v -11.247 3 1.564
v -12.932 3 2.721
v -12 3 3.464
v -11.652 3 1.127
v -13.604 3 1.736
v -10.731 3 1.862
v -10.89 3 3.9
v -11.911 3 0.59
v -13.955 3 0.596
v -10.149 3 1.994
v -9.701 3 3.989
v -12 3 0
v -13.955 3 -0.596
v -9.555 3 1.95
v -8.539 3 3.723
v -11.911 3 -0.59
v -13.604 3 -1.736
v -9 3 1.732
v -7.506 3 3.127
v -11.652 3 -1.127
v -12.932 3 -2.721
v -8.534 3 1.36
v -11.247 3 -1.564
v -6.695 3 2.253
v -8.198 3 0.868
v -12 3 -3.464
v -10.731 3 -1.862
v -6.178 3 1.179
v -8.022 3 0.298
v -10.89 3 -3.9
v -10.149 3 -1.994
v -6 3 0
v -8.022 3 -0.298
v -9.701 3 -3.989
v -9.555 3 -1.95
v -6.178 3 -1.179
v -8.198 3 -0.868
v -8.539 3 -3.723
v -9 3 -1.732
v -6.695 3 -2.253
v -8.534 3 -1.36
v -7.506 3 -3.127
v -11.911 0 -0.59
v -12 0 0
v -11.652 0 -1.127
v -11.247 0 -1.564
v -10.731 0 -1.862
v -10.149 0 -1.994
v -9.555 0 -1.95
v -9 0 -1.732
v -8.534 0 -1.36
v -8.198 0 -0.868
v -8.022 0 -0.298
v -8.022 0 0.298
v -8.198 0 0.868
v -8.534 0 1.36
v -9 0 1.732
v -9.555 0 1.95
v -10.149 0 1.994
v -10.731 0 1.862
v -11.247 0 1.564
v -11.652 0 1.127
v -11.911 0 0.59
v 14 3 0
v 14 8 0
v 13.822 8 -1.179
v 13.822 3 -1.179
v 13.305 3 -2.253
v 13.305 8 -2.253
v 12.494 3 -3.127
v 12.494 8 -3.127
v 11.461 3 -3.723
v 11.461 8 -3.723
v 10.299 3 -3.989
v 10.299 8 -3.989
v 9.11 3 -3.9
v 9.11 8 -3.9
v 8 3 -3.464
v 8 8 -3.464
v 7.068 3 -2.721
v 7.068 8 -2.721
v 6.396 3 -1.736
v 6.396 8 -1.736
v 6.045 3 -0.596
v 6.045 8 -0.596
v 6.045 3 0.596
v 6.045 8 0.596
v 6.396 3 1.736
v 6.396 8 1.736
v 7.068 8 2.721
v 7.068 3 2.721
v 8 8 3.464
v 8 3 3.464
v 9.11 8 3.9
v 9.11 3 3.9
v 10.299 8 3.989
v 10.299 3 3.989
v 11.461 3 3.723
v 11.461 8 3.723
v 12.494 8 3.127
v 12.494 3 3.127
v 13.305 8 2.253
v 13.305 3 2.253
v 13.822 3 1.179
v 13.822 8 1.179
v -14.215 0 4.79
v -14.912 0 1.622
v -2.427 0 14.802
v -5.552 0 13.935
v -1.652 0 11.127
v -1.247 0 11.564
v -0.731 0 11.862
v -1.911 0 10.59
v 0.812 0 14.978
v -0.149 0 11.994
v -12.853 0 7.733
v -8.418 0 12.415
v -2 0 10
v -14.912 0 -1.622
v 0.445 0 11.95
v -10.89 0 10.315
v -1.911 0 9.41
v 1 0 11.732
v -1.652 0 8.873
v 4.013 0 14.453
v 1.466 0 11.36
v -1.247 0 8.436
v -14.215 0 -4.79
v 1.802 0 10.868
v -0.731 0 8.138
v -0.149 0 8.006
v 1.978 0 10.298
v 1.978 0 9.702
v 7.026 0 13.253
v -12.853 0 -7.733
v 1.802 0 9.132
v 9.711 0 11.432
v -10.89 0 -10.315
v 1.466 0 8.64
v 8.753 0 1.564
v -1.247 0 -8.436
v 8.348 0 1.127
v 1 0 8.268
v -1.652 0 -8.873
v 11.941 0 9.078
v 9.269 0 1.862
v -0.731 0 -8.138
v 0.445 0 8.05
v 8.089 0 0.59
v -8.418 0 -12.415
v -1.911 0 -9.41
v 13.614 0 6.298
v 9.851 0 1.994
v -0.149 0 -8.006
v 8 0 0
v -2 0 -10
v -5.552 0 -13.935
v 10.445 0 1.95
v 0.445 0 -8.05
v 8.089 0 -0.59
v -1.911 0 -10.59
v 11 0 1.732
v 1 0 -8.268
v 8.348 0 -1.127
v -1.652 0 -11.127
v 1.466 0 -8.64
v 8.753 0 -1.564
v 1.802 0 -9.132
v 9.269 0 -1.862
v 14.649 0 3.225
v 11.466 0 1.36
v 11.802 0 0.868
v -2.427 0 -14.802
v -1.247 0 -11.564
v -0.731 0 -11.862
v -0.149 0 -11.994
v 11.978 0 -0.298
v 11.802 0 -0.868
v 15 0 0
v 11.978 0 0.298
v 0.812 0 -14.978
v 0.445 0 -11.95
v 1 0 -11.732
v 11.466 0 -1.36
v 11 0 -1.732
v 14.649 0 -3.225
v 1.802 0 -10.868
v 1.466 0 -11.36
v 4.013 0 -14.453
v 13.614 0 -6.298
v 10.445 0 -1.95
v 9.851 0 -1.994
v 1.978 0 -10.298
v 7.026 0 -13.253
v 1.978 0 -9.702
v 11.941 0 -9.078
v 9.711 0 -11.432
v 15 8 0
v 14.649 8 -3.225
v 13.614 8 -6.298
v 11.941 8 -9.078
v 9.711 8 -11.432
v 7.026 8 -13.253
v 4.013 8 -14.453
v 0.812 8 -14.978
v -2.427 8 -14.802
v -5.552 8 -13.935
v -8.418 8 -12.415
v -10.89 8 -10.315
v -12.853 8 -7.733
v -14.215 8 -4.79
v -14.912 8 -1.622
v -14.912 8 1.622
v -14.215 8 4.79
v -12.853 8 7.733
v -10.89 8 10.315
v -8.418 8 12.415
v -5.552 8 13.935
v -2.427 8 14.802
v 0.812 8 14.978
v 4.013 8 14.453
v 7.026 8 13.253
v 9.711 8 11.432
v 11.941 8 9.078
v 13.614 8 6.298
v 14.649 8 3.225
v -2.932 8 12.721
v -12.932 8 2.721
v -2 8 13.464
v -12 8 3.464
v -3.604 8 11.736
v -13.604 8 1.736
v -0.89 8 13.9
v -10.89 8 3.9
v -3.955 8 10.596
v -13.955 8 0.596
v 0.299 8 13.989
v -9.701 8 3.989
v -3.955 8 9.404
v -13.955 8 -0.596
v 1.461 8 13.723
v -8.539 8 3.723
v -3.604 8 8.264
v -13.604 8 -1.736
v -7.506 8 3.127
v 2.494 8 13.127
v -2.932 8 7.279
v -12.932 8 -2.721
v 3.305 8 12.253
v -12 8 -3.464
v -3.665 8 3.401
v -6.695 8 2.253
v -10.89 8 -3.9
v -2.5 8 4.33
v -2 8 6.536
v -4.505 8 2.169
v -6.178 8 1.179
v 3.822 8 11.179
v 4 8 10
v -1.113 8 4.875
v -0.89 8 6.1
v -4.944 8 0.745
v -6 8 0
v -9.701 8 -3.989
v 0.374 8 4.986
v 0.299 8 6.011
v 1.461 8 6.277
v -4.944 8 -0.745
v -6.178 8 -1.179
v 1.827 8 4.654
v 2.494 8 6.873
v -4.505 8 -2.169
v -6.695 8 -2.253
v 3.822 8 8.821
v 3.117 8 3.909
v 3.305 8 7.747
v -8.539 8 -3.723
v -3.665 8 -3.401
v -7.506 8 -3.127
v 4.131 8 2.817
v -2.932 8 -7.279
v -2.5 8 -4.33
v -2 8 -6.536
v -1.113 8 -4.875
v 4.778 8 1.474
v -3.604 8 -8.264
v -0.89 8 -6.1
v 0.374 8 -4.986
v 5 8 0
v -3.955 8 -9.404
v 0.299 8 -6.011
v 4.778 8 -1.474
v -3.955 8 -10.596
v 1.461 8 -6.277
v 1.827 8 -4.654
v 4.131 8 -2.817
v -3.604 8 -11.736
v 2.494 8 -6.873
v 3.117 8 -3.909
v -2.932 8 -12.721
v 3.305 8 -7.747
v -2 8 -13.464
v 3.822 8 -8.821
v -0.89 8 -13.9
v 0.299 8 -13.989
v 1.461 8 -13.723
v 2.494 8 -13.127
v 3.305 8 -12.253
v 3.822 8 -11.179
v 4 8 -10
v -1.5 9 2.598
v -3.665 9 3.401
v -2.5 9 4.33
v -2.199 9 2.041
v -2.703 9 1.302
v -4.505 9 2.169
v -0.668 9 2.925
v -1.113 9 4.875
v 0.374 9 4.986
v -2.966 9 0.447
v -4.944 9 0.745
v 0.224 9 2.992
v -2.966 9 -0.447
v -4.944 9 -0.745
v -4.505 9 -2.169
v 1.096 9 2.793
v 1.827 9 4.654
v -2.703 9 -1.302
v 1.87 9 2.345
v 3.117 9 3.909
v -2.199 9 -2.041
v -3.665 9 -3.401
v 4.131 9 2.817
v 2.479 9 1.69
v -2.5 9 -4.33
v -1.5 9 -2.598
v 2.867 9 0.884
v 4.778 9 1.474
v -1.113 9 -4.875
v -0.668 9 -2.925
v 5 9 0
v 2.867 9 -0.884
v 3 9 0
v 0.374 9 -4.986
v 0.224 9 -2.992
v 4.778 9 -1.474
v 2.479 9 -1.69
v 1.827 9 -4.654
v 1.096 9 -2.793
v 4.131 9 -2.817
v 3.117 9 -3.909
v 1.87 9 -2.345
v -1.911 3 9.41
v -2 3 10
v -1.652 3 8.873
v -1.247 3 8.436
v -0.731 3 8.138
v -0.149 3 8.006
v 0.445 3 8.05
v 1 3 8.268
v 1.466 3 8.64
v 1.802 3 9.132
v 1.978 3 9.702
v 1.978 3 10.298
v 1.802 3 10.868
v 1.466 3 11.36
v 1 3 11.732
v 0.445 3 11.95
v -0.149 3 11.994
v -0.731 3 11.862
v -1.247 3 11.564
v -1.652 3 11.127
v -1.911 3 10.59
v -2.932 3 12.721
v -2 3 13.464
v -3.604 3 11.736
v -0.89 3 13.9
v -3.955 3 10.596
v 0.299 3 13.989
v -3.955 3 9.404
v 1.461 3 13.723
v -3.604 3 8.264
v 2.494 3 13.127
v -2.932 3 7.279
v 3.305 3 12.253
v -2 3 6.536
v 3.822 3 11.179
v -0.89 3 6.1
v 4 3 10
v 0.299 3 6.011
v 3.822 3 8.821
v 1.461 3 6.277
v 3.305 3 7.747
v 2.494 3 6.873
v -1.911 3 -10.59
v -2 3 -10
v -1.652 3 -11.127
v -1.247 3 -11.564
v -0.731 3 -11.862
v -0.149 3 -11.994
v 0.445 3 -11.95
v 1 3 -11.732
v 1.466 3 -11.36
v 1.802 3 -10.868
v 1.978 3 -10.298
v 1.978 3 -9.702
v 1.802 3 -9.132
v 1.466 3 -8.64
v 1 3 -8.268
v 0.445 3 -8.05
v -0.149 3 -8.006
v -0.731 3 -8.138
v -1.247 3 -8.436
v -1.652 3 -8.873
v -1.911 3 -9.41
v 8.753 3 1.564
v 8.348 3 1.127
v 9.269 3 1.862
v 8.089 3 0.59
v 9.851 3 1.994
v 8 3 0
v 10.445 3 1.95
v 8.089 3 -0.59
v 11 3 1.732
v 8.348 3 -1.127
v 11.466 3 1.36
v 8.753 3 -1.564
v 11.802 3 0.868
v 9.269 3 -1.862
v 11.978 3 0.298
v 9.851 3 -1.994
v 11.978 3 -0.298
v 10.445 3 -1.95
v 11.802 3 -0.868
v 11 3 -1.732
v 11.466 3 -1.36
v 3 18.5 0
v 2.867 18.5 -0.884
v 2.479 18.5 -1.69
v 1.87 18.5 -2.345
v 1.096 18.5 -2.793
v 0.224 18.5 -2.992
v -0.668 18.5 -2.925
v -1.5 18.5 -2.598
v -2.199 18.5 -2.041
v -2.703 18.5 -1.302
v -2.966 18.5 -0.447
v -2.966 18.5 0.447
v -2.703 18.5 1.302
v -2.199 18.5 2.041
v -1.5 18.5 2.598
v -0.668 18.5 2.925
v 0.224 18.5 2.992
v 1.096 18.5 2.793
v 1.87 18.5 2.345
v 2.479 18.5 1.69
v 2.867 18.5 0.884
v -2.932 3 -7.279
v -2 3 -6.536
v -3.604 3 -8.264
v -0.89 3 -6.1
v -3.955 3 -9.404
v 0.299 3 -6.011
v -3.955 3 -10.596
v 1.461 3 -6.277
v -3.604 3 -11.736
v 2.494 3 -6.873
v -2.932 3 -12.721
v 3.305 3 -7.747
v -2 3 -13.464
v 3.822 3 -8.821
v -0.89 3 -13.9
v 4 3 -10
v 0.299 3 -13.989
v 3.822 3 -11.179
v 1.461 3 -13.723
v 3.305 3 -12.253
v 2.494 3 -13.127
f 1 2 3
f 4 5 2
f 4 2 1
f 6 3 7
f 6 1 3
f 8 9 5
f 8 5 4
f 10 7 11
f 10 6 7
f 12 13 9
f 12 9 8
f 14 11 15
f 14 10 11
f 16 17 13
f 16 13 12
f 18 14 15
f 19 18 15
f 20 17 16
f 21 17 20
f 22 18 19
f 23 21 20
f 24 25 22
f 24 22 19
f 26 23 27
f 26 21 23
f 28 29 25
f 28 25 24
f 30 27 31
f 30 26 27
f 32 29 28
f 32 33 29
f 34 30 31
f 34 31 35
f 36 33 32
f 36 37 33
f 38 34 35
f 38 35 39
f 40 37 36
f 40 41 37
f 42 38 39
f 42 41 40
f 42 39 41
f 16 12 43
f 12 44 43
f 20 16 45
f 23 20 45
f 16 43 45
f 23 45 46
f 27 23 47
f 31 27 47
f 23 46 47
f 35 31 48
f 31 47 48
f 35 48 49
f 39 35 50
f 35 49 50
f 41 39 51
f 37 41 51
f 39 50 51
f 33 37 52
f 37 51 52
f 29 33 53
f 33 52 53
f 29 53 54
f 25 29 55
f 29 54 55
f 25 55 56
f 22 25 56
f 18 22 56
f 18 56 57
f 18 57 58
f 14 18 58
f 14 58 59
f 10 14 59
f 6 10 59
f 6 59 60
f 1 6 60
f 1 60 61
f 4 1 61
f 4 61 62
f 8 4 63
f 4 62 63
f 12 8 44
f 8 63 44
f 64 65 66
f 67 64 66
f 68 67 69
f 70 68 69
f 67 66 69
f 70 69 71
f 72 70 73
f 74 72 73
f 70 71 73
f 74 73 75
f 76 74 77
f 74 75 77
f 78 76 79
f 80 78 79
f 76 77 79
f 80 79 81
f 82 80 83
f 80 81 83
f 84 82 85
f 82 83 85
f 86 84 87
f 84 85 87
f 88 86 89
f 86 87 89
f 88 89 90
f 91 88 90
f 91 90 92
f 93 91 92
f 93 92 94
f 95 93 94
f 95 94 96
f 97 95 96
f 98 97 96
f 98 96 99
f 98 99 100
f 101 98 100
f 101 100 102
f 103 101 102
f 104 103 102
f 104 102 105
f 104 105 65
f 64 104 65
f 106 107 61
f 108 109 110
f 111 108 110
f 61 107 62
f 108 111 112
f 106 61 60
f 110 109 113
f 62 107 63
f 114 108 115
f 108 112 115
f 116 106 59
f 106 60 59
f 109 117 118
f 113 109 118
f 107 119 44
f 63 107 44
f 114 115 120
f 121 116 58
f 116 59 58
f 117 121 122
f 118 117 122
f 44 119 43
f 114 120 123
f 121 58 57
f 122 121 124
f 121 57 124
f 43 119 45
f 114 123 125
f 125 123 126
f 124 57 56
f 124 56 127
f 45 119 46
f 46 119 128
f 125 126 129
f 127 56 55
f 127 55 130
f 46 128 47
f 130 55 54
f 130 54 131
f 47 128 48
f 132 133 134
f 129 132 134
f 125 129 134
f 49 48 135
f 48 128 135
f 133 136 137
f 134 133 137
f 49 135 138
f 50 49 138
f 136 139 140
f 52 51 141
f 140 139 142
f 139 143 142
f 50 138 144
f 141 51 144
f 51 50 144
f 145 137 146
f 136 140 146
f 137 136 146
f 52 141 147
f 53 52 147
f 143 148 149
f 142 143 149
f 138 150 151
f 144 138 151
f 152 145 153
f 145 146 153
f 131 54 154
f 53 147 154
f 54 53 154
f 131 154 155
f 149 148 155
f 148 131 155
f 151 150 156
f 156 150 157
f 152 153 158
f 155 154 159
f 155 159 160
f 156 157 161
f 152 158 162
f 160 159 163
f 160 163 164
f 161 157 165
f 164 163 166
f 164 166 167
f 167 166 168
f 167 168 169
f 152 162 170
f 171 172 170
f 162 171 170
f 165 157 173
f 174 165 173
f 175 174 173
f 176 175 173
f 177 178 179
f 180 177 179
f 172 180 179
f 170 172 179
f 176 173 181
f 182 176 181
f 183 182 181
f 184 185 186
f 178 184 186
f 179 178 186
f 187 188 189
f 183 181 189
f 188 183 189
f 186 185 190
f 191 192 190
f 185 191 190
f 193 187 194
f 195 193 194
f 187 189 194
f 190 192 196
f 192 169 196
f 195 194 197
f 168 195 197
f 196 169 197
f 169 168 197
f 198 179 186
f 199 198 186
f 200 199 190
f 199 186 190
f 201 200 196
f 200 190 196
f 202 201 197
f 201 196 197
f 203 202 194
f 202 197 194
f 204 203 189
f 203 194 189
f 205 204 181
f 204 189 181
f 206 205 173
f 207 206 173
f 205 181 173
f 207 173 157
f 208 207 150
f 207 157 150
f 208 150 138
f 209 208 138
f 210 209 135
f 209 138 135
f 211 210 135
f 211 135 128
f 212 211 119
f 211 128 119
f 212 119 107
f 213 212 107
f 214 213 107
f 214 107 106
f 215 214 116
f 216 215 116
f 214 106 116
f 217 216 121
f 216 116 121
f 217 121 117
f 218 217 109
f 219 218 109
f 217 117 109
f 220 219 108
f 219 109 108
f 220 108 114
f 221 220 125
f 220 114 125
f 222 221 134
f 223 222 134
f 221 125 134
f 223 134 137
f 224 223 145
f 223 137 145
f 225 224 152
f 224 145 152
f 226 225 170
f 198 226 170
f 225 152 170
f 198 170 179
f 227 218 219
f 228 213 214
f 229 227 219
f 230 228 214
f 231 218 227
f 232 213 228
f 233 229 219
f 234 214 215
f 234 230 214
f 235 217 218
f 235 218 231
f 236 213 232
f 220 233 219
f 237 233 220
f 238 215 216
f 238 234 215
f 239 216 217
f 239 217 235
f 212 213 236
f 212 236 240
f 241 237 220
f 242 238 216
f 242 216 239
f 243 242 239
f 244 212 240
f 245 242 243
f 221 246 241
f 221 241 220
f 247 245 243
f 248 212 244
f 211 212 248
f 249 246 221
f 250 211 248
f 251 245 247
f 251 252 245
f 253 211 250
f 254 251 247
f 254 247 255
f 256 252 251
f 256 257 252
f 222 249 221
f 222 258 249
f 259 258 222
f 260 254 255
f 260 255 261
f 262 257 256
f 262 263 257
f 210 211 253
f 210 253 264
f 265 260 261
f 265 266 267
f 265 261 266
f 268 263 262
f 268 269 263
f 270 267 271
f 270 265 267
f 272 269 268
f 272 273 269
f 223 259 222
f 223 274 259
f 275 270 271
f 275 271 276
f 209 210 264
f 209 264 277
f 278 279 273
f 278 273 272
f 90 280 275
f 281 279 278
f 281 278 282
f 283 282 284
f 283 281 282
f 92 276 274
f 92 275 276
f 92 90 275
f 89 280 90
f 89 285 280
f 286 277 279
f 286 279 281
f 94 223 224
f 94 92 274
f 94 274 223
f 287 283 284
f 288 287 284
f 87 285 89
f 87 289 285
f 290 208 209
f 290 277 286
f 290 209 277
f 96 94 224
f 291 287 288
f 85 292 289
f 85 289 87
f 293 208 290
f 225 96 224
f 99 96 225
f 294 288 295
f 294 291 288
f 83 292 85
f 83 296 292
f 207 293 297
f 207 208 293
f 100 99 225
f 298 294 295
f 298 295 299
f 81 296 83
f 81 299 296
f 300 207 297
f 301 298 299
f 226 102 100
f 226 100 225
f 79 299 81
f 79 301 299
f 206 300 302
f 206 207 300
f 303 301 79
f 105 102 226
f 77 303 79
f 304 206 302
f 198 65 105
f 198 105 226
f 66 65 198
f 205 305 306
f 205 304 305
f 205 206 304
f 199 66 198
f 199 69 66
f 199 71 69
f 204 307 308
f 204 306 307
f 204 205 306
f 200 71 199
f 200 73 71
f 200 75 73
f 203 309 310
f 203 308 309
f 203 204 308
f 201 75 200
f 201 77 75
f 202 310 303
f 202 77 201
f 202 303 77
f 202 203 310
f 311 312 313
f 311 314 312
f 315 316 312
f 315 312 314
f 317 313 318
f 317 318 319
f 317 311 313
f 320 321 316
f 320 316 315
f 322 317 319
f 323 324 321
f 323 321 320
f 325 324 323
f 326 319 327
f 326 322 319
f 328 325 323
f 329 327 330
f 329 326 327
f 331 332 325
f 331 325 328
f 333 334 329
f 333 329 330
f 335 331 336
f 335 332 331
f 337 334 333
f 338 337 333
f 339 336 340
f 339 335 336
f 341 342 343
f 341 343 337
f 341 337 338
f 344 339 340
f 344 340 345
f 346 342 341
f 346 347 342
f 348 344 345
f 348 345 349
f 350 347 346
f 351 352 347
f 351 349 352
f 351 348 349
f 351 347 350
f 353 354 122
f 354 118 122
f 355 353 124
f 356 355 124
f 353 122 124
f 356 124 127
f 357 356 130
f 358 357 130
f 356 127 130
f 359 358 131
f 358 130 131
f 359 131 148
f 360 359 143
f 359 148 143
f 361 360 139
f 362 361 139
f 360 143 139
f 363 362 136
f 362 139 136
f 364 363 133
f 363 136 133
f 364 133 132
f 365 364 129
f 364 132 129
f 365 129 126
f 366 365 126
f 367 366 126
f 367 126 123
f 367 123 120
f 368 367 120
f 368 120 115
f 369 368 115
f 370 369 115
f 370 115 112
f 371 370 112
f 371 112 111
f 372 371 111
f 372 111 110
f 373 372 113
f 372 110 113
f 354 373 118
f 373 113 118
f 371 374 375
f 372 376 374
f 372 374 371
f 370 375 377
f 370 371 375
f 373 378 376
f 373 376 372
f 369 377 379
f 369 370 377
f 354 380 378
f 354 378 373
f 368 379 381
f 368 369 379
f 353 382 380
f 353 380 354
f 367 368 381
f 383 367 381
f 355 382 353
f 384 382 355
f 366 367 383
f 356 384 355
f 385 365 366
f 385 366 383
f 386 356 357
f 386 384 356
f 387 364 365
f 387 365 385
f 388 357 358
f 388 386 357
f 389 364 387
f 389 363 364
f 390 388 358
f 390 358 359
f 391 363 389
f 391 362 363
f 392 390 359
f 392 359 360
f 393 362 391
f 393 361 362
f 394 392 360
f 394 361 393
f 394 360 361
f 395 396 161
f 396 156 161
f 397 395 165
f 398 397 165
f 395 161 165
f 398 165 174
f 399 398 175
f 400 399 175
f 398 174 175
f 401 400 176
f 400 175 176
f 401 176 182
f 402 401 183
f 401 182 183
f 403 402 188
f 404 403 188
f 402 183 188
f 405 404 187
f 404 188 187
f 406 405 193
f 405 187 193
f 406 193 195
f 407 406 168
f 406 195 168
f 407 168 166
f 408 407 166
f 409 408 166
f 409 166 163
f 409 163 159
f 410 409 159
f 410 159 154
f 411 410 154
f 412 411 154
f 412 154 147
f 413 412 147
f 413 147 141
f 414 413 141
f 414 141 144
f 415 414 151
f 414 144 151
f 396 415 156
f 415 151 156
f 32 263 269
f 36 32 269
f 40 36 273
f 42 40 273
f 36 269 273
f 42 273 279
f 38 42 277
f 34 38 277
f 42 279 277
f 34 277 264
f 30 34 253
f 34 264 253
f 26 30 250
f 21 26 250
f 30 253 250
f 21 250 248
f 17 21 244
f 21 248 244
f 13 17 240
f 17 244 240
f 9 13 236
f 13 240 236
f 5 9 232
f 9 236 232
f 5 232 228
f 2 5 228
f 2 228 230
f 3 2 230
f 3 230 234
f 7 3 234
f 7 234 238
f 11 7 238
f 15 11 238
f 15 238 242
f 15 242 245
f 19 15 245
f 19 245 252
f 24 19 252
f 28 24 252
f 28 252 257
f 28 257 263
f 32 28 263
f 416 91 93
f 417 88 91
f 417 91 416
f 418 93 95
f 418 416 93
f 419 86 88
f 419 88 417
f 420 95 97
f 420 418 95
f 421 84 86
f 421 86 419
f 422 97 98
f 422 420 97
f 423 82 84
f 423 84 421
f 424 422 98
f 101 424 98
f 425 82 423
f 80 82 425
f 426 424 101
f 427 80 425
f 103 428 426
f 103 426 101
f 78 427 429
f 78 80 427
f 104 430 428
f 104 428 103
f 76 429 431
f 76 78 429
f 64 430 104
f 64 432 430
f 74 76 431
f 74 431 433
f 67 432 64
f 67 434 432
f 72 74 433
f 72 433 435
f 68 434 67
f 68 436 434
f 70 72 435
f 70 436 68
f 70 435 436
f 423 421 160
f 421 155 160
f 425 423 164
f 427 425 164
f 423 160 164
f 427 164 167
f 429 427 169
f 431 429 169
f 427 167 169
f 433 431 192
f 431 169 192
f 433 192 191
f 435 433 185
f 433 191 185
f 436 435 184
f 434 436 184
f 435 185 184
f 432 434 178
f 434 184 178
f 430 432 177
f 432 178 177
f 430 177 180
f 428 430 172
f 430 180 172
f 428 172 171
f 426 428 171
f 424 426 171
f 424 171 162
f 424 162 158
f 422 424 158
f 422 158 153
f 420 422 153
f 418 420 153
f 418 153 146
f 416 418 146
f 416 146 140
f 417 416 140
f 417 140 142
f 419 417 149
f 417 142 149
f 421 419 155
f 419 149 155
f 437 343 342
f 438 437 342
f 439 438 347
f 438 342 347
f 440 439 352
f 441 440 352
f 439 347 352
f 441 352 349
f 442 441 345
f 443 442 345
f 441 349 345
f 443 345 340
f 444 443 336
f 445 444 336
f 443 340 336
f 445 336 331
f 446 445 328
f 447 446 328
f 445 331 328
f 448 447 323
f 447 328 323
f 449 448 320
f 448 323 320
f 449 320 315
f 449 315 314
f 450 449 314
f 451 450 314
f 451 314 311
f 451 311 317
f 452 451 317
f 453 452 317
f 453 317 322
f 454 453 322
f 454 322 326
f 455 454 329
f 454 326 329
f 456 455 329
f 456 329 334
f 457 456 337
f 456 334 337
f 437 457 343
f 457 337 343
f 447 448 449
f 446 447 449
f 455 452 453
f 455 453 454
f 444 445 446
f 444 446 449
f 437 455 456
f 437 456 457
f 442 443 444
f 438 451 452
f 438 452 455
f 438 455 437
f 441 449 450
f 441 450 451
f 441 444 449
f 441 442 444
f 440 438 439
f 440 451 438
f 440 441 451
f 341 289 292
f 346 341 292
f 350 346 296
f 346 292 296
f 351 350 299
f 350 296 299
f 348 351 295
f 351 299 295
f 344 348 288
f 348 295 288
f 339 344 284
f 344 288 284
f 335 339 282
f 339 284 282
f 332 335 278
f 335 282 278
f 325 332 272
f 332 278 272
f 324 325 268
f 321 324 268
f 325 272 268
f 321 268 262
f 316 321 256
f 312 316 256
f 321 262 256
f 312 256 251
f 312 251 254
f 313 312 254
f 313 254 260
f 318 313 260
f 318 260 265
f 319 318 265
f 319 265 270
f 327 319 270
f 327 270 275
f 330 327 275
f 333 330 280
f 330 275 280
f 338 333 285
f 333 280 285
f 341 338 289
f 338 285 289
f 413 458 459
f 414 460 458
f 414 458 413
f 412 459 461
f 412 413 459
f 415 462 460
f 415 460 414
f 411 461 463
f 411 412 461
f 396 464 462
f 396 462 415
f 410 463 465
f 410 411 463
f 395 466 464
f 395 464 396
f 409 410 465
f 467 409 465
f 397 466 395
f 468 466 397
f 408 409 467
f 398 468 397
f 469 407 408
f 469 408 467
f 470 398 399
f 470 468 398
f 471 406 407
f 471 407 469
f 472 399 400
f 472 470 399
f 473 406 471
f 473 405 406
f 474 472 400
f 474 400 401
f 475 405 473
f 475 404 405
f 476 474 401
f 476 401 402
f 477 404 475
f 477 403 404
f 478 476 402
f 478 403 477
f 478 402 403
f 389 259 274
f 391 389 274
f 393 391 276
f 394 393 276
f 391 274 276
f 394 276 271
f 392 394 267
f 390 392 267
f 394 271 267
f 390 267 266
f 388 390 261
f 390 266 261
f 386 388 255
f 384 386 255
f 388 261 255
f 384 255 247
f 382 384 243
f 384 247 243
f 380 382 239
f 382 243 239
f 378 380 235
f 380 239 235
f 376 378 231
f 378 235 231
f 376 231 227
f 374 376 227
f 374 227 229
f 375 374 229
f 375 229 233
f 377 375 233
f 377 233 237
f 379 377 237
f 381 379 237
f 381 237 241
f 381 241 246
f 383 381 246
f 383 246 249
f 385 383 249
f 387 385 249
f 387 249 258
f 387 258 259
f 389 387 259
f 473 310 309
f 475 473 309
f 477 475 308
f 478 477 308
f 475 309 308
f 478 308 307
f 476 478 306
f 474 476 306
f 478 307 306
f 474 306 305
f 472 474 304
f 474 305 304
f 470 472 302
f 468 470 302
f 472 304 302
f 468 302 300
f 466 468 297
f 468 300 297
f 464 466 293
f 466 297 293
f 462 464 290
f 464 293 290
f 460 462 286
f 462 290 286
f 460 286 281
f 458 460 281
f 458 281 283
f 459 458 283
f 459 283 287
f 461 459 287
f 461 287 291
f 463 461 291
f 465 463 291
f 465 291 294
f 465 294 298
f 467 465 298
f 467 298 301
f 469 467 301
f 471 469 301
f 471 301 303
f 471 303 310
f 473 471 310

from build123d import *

# Parameters (mm, degrees)
SKETCH1_R           = 15
BOSS_EXTRUDE1_DEPTH = 8
SKETCH2_R           = 5
BOSS_EXTRUDE2_DEPTH = 1
SKETCH3_R           = 3
BOSS_EXTRUDE3_DEPTH = 9.5
HOLE1_D             = 4
HOLE1_CBORE_D       = 8
HOLE1_CBORE_DEPTH   = 5


with BuildPart() as part:
    # Sketch1 → Boss-Extrude1 (new body)
    with BuildSketch(Plane(origin=(0, 0, 0), x_dir=(1, 0, 0), z_dir=(0, 1, 0))):
        Circle(SKETCH1_R)
    extrude(amount=BOSS_EXTRUDE1_DEPTH)

    # Sketch2 → Boss-Extrude2 (add)
    with BuildSketch(Plane(origin=(0, 8, 0), x_dir=(1, 0, 0), z_dir=(0, 1, 0))):
        Circle(SKETCH2_R)
    extrude(amount=BOSS_EXTRUDE2_DEPTH)

    # Sketch3 → Boss-Extrude3 (add)
    with BuildSketch(Plane(origin=(0, 9, 0), x_dir=(1, 0, 0), z_dir=(0, 1, 0))):
        Circle(SKETCH3_R)
    extrude(amount=BOSS_EXTRUDE3_DEPTH)

    # Hole1 (through all)
    with Locations(Plane(origin=(0, 8, 0), x_dir=(1, 0, 0), z_dir=(0, 1, 0))):
        with Locations((-10, 0), (0, 10), (10, 0), (0, -10)):
            CounterBoreHole(HOLE1_D / 2, HOLE1_CBORE_D / 2, HOLE1_CBORE_DEPTH)


solid = part.part
